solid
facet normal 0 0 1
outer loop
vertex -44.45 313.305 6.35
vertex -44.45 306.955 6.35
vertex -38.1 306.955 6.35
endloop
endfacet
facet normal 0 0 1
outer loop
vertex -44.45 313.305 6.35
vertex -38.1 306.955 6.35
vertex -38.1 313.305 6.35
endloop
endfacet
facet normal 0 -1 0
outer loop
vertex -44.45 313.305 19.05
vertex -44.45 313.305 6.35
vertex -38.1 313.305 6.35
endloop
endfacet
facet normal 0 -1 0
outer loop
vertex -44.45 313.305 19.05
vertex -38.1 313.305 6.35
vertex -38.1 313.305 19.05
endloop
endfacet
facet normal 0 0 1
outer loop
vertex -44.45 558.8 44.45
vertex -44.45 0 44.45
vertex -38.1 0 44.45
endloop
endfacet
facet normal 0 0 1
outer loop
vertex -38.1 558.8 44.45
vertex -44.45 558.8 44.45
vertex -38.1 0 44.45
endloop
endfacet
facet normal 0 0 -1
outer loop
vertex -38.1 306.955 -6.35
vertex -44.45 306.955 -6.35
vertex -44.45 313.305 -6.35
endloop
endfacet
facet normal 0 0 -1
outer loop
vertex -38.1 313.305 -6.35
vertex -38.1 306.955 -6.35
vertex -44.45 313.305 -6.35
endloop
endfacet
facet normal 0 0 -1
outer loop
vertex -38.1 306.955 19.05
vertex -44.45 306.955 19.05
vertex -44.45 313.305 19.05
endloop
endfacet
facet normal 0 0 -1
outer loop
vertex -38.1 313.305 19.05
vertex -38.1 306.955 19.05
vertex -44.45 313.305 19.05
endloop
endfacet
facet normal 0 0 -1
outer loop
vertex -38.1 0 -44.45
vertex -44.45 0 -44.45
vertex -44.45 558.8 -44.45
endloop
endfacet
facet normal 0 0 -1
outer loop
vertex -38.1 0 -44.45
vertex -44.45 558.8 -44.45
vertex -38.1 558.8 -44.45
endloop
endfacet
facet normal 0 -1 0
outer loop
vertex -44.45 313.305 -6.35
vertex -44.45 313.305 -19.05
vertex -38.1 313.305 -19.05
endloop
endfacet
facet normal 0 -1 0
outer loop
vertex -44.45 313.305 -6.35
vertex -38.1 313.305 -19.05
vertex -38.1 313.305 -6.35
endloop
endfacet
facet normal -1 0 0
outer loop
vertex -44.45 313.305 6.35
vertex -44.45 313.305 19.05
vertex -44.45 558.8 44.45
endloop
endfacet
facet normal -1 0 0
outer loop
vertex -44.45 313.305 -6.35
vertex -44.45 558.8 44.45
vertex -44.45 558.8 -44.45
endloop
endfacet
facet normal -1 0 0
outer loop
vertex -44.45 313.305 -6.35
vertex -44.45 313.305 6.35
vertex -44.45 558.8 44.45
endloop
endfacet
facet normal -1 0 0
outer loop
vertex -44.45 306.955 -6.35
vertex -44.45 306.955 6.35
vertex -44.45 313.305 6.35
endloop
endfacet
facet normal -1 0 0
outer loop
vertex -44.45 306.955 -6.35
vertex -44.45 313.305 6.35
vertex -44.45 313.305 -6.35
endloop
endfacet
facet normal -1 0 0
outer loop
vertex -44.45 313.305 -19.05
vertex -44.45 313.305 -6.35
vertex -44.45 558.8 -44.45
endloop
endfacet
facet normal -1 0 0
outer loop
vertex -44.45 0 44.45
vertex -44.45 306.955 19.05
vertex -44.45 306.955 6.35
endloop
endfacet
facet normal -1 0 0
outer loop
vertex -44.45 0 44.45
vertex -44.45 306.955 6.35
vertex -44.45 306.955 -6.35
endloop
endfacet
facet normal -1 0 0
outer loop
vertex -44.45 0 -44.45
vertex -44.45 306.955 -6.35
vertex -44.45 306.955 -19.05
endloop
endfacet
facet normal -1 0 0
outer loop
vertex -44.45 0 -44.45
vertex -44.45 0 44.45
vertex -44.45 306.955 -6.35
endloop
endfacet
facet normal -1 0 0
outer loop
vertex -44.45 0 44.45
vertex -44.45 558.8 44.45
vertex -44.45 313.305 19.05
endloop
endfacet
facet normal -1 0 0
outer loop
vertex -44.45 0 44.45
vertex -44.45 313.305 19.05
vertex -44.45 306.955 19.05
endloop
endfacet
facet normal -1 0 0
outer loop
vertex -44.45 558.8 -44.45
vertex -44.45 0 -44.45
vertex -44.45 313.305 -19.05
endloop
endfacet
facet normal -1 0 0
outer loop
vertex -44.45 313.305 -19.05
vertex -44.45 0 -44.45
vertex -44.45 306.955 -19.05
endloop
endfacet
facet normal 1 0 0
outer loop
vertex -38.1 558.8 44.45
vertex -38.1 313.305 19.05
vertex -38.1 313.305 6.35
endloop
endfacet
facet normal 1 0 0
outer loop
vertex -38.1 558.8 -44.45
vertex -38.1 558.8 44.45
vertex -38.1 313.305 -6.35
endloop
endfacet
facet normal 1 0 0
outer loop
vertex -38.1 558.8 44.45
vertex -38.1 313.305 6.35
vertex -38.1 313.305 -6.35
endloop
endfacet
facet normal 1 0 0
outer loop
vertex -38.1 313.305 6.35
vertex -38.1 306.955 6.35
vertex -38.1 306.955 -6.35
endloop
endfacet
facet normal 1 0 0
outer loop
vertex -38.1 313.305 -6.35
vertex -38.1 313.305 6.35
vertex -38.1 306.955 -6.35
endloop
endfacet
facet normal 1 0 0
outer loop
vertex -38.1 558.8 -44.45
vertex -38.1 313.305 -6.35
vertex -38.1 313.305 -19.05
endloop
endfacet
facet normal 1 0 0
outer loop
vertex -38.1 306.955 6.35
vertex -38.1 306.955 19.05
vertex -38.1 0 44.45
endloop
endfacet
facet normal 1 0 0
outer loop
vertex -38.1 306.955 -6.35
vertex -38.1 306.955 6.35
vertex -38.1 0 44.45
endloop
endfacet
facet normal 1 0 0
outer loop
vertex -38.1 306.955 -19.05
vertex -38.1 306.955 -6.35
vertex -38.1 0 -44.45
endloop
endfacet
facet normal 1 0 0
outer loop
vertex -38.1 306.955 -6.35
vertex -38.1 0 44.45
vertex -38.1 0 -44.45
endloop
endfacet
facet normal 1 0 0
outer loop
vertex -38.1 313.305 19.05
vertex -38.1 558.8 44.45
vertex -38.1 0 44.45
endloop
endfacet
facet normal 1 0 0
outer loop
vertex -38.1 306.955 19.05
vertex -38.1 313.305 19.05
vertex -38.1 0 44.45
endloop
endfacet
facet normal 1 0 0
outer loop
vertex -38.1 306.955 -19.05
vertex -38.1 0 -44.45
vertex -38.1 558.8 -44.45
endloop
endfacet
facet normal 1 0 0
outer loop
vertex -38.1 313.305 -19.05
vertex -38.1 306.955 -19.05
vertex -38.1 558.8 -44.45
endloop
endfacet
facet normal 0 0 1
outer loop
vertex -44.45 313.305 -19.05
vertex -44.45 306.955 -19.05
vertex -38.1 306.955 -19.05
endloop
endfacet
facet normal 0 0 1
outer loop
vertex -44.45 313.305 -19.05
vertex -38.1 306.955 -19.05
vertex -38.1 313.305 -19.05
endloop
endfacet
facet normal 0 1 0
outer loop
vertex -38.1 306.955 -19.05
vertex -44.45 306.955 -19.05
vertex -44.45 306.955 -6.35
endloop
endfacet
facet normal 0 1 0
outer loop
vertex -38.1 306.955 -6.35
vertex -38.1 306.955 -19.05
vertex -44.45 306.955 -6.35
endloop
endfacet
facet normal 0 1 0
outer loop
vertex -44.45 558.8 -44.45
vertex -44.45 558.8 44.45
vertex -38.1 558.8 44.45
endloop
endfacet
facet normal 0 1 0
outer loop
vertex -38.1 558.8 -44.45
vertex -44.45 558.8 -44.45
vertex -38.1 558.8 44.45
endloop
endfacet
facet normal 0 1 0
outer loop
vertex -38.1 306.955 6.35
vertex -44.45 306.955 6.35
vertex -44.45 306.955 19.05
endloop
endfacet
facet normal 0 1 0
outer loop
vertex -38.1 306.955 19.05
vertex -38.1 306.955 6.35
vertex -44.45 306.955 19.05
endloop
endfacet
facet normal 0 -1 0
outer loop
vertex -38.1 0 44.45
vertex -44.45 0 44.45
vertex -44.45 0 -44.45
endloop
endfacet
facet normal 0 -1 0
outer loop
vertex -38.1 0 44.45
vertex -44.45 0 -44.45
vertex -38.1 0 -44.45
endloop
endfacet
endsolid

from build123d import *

# Parameters (mm, degrees)
SKETCH2_W           = 6.35
SKETCH2_H           = 88.9
BOSS_EXTRUDE1_DEPTH = 558.8
SKETCH3_W           = 12.7
SKETCH3_H           = 6.35
CUT_EXTRUDE1_DEPTH  = 561.60107474


with BuildPart() as part:
    # Sketch2 → Boss-Extrude1 (new body)
    with BuildSketch(Plane(origin=(0, 0, 0), x_dir=(1, 0, 0), z_dir=(0, 1, 0))):
        with Locations((-41.275, 0)):
            Rectangle(SKETCH2_W, SKETCH2_H)
    extrude(amount=BOSS_EXTRUDE1_DEPTH)

    # Sketch3 → Cut-Extrude1 (cut, through all)
    with BuildSketch(Plane.ZY.offset(44.45)):
        with Locations((-12.7, 310.13)):
            Rectangle(SKETCH3_W, SKETCH3_H)
        with Locations((12.7, 310.13)):
            Rectangle(SKETCH3_W, SKETCH3_H)
    extrude(amount=-CUT_EXTRUDE1_DEPTH, mode=Mode.SUBTRACT)


solid = part.part
